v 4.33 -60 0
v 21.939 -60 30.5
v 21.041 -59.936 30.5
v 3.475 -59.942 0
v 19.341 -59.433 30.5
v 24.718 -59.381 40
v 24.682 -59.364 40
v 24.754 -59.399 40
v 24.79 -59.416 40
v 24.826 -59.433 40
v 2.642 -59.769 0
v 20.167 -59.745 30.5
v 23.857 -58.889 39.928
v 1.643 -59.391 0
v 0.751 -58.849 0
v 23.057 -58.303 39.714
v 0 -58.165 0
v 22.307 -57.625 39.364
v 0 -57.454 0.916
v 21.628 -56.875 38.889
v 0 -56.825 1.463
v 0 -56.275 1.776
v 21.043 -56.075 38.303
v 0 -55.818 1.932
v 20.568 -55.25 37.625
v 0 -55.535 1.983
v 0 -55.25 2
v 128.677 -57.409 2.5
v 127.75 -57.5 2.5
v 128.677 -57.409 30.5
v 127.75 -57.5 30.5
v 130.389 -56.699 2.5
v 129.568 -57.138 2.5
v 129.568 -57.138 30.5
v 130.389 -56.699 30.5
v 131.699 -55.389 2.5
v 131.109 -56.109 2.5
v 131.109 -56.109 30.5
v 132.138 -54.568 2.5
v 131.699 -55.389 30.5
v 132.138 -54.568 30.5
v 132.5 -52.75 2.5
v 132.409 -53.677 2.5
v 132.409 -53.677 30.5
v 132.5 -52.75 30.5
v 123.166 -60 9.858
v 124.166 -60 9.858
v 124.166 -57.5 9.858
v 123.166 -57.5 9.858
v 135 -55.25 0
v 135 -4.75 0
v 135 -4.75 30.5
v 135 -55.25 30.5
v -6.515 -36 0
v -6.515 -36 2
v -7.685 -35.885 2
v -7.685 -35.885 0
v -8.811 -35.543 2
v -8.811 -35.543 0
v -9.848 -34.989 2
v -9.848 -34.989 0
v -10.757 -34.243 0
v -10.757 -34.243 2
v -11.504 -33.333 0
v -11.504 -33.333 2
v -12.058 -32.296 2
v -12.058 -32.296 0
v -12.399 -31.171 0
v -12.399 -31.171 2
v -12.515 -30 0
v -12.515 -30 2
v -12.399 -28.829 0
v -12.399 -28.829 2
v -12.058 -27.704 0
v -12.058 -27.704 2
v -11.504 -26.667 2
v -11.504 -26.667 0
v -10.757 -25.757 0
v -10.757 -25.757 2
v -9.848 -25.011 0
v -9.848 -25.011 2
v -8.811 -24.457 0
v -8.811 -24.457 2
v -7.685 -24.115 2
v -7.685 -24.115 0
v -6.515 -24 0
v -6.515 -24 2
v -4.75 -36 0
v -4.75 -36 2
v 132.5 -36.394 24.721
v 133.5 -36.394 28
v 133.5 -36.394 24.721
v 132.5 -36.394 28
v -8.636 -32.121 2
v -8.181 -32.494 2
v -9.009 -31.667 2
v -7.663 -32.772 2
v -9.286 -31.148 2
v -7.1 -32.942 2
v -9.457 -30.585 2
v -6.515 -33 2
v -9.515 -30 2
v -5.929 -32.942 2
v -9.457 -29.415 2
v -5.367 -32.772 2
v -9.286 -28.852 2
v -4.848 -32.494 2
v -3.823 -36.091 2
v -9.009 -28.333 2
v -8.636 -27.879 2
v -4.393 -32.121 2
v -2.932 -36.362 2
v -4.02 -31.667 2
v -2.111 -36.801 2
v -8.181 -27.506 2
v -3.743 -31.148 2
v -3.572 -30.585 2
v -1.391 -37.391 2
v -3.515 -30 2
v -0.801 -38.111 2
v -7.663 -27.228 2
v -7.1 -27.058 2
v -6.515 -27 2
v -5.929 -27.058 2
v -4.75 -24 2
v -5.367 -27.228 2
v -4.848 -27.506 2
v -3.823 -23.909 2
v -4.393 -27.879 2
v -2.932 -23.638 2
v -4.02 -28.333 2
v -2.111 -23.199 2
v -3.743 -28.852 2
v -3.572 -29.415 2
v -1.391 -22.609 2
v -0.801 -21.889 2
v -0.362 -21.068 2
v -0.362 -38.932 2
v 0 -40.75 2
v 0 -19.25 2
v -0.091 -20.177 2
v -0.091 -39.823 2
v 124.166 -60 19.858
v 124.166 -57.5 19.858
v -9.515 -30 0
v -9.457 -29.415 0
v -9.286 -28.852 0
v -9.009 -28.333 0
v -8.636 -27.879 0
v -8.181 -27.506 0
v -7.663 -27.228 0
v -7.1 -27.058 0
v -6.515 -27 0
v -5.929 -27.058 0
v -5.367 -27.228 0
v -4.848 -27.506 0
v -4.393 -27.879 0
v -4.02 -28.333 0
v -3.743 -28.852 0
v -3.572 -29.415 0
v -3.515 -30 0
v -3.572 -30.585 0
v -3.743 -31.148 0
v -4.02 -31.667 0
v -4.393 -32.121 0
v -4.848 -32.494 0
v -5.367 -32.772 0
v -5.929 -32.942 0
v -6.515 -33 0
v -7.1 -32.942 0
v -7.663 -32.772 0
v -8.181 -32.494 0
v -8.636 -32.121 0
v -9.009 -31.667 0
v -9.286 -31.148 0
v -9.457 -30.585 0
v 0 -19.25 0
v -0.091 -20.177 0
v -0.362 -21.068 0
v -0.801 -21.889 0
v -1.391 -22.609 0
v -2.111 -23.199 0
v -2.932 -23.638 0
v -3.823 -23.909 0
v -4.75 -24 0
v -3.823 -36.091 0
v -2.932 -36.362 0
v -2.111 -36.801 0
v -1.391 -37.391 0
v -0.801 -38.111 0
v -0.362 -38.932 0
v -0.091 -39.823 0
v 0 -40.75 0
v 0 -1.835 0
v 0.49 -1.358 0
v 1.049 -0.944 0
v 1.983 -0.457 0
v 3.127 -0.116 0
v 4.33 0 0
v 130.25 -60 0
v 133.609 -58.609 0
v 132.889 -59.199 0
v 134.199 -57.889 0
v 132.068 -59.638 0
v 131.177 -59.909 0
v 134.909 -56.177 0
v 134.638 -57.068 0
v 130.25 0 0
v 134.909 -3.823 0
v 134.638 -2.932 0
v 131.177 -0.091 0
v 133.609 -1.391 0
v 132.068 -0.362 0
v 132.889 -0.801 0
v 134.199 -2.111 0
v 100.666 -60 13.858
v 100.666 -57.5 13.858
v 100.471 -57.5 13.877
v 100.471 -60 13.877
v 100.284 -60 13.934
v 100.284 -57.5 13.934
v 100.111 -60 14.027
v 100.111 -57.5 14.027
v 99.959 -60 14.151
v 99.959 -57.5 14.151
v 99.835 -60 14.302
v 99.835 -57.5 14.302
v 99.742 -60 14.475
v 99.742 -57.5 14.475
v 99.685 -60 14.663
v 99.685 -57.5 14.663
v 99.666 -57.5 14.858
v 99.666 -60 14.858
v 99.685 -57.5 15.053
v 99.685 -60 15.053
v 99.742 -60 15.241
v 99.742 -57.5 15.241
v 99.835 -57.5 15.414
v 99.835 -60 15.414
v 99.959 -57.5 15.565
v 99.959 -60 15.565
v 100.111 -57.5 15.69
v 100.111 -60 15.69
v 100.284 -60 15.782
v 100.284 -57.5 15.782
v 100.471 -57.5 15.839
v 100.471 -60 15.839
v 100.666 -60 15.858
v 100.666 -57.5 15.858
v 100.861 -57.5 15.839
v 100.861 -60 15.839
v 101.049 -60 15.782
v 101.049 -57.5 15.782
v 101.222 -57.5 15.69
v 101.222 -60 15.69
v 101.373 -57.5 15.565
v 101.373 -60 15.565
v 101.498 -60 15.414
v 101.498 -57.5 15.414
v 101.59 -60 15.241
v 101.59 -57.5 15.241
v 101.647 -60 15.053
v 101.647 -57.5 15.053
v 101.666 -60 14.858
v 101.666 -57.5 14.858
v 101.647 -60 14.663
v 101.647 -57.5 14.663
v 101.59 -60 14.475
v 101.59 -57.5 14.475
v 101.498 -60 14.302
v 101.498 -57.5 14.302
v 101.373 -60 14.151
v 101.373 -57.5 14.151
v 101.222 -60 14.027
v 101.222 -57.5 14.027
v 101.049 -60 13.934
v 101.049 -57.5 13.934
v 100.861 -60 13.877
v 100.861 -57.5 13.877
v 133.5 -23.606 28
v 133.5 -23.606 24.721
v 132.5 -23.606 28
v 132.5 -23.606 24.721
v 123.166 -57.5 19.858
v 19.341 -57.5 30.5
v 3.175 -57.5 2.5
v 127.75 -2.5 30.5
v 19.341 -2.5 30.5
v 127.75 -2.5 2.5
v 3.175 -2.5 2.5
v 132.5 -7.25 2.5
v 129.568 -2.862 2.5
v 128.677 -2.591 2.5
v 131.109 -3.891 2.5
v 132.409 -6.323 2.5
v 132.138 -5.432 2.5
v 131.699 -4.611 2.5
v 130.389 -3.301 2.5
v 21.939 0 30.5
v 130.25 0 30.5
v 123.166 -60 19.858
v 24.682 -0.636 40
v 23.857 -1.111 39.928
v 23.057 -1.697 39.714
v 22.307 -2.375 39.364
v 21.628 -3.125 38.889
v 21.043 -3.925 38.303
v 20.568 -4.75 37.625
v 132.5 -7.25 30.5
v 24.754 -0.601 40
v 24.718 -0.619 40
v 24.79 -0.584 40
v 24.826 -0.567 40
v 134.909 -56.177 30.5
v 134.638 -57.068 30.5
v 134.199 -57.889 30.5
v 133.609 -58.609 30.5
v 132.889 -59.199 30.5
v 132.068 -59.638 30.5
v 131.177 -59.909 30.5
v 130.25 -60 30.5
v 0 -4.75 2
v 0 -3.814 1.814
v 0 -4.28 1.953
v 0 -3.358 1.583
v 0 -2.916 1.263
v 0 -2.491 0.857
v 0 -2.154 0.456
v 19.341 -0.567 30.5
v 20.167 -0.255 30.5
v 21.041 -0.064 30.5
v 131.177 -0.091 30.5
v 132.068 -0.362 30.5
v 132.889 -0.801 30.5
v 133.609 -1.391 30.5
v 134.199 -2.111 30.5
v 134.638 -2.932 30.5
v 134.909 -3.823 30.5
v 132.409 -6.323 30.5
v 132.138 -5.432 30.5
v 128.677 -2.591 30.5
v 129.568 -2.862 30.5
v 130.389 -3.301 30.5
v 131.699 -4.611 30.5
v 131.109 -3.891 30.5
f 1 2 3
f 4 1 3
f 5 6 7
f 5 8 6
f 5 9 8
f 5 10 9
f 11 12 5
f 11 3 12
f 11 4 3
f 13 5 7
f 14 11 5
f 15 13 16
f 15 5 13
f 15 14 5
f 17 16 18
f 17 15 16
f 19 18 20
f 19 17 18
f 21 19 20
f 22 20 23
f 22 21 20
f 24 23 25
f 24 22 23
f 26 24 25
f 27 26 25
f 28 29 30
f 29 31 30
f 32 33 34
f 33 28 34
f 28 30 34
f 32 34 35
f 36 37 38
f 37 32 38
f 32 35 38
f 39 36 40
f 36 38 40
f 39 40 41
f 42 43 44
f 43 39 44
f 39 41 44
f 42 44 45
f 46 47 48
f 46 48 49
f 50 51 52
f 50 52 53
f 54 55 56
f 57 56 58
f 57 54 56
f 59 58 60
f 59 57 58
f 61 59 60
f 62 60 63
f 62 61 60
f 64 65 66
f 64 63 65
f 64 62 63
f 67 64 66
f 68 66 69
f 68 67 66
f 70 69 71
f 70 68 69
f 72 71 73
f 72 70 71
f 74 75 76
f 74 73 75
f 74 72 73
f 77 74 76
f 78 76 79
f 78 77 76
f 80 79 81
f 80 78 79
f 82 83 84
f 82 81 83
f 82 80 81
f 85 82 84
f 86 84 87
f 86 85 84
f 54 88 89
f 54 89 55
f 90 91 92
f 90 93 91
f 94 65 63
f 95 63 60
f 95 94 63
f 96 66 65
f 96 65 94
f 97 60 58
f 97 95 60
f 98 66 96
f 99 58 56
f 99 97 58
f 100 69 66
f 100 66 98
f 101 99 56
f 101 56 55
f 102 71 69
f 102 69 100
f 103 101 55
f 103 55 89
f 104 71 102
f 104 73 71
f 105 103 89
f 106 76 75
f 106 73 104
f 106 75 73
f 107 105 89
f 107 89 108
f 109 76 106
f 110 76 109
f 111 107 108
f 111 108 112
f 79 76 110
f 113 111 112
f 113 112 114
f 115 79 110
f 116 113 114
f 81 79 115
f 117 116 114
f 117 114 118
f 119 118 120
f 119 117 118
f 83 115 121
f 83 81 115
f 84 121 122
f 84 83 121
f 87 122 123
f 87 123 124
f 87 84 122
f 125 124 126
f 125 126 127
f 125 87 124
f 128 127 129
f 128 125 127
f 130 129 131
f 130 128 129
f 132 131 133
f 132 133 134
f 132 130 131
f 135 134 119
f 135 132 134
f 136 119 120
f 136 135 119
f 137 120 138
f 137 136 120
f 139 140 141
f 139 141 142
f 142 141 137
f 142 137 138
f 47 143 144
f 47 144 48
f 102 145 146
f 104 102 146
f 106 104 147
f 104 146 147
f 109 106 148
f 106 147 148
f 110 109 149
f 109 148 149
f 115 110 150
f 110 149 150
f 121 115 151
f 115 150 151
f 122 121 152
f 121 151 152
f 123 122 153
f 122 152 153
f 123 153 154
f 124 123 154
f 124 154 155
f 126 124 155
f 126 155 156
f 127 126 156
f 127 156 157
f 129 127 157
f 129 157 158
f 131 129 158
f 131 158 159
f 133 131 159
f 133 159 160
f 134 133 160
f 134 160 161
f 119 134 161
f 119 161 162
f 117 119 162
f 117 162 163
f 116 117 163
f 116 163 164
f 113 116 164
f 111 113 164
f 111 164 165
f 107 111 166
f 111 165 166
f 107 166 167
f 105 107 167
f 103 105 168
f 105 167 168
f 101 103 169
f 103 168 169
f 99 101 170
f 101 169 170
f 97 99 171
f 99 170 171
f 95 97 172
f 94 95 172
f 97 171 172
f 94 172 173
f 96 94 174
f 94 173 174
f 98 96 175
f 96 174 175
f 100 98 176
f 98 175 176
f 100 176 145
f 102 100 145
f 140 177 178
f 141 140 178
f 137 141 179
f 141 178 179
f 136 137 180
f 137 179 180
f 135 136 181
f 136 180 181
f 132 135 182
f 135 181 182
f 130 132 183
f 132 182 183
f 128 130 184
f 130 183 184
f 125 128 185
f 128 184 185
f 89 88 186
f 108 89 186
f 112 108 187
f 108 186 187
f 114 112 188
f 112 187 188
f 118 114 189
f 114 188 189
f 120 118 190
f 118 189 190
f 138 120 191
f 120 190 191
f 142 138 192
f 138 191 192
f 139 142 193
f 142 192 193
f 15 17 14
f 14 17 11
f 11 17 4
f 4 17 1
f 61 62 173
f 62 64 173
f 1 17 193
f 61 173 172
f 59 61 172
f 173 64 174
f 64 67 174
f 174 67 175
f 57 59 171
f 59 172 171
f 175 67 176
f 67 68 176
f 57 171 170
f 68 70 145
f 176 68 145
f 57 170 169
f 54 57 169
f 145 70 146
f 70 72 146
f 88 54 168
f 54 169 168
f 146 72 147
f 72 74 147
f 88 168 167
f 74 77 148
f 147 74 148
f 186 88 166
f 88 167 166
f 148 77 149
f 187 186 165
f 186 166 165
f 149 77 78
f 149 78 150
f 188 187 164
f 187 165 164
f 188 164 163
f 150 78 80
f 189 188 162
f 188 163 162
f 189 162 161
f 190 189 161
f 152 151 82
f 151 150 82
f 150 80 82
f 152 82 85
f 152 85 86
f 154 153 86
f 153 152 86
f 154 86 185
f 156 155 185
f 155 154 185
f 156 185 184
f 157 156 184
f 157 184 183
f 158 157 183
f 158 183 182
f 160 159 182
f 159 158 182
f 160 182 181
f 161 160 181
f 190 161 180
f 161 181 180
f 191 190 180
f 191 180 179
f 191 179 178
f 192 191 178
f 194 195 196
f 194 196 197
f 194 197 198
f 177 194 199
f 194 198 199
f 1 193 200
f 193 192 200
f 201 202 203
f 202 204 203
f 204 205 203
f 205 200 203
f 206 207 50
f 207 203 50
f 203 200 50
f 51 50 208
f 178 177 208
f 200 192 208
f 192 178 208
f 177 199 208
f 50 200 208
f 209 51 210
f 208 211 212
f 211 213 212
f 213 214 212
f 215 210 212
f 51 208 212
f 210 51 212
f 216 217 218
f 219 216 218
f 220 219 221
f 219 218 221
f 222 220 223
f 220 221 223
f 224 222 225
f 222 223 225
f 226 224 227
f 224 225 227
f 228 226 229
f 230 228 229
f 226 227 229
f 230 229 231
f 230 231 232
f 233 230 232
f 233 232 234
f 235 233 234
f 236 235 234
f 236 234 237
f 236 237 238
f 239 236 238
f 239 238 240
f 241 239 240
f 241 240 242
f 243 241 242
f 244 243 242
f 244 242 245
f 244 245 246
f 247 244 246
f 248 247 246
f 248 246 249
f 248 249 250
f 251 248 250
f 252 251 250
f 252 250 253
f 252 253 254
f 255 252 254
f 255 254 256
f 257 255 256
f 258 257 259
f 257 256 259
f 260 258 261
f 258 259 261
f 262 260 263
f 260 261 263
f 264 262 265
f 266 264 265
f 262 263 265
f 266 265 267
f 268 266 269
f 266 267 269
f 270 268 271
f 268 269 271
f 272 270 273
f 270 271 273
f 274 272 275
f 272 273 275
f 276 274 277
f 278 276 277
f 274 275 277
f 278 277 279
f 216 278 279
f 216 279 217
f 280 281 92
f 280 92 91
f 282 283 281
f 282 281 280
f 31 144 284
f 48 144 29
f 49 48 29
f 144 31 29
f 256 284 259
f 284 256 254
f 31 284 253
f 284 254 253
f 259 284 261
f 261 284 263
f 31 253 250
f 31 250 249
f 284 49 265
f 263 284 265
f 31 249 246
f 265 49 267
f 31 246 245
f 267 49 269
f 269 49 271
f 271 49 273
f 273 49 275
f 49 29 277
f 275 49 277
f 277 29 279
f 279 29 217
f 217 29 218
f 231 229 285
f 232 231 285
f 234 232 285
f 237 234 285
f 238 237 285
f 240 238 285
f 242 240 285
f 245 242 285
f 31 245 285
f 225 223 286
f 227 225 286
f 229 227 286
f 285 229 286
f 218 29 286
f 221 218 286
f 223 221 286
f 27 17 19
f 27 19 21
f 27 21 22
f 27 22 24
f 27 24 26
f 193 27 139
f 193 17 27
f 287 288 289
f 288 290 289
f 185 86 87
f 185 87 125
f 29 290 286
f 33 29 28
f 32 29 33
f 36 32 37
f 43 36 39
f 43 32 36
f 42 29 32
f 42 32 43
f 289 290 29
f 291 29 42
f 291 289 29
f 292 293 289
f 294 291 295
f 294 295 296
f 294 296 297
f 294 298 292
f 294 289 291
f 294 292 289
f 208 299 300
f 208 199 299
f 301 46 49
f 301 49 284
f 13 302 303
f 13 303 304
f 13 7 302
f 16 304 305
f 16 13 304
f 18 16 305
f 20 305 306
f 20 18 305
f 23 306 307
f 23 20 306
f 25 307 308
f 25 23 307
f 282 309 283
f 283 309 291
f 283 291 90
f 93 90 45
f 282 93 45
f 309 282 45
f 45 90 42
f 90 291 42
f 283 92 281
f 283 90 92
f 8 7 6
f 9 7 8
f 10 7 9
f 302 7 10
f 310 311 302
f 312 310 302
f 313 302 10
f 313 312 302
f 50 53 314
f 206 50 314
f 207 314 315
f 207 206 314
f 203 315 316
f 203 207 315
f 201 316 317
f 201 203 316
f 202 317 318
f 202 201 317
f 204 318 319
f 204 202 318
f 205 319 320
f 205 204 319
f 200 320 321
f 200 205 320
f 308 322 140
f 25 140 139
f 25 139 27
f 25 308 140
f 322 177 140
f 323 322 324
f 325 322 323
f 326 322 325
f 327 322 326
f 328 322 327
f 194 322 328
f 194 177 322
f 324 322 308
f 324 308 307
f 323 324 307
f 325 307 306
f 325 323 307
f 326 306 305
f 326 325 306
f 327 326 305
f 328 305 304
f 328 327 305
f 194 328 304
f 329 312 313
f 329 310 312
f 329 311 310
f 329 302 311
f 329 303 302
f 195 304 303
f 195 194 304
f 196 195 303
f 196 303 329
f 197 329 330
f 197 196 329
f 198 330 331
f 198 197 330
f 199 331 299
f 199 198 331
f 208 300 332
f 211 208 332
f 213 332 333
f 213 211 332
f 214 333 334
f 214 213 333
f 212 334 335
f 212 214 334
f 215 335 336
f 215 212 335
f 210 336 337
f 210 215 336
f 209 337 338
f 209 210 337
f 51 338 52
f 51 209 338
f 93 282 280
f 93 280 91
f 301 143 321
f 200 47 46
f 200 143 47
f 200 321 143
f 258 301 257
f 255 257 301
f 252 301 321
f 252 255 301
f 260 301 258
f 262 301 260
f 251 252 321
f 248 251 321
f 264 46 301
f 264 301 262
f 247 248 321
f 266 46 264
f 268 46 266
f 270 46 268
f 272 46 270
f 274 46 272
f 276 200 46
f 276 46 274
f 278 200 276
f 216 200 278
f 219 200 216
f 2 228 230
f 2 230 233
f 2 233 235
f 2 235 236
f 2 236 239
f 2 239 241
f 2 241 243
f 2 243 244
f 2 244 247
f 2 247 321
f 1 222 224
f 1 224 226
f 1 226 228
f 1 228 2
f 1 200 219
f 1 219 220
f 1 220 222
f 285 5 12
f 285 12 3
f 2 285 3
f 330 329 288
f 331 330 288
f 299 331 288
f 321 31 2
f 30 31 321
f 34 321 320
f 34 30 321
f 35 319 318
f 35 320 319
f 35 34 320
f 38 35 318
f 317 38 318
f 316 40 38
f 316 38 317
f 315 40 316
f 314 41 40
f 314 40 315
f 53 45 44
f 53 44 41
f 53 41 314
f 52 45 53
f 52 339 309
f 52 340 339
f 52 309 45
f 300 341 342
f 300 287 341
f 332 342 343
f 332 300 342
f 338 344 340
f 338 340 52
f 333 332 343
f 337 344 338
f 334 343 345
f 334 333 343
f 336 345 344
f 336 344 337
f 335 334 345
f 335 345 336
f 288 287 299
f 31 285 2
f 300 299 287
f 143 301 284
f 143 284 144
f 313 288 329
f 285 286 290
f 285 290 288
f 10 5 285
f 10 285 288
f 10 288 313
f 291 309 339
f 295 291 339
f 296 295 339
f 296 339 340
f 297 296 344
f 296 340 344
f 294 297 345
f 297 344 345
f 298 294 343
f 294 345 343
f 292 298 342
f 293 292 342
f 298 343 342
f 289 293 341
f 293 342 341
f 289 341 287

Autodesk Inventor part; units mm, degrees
ref_plane "YZ Plane" through (0, 0, 0) normal (1, 0, 0) x (0, 1, 0)
ref_plane "XZ Plane" through (0, 0, 0) normal (0, 1, 0) x (-1, 0, 0)
ref_plane "XY Plane" through (0, 0, 0) normal (0, 0, 1) x (1, 0, 0)
sketch "Skizze1" plane through (0, 0, 0) normal (0, 0, 1) x (1, 0, 0)
  line L0 (0, 0) -> (135, 0)
  line L1 (135, 0) -> (135, -60)
  line L2 (135, -60) -> (0, -60)
  line L3 (0, -60) -> (0, 0)
  dimension "d0" = 135
  dimension "d1" = 60
extrude "Extrusion1" add sketch "Skizze1" along normal blind 40
chamfer "Fase1" distance 38 angle 30 1 edges at (0, -30, 40) measured on face at (0, -20, 13.3333)
shell "Wandung1" thickness 2.5 removed faces 1 at (59.626207, -20, 40)
sketch "Skizze2" plane through (0, 0, 40) normal (0, 0, 1) x (1, 0, 0)
  line L0 (24.826062, -57.5) -> (24.826062, -2.5)
  line L1 (24.826062, -2.5) -> (24.826062, 0)
  line L2 (24.826062, 0) -> (24.826062, -57.5)
  line L3 (24.826062, -57.5) -> (24.826062, -60)
  line L4 (32.285534, -57.5) -> (32.285534, -2.5)
  line L5 (32.285534, -2.5) -> (132.5, -2.5)
  line L6 (132.5, -2.5) -> (132.5, -57.5)
  line L7 (132.5, -57.5) -> (32.285534, -57.5)
  line L8 (21.290528, -60) -> (21.290528, 0)
  line L9 (21.290528, -60) -> (24.826062, -60)
  line L10 (135.042932, -60) -> (135.042932, 0)
  line L11 (135.042932, 0) -> (24.826062, 0)
  line L12 (24.826062, -60) -> (135.042932, -60)
  line L13 (24.826062, 0) -> (21.290528, 0)
  point P0 (0, 0)
  point P1 (32.285534, -2.5)
extrude "Extrusion2" cut sketch "Skizze2" against normal blind 9.5 contours L0 L1 L11 L10 L12 L3
sketch "Skizze3" plane through (0, -60, 0) normal (0, -1, 0) x (1, 0, 0)
  point P0 (0, 0)
  point P1 (100.666226, 14.858037)
hole "Bohrung1" at (100.666226, -60, 14.858037) direction (0, 1, 0) diameter 2 depth 8 tip angle 118
sketch "Skizze4" plane through (132.5, -57.5, 2.5) normal (-1, 0, 0) x (0, 0, 1)
  line L0 (22.221117, 33.89428) -> (25.5, 33.89428)
  line L1 (25.5, 33.89428) -> (25.5, 21.10572)
  line L2 (25.5, 21.10572) -> (22.221117, 21.10572)
  line L3 (22.221117, 21.10572) -> (22.221117, 33.89428)
  line L4 (0, 0) -> (0, 55)
  line L5 (0, 27.5) -> (28, 27.5)
  line L6 (28, 0) -> (28, 55)
  line L7 (28, 57.5) -> (28, -2.5)
  point P0 (-2.5, 57.5)
  dimension "d22" = 2.5
extrude "Extrusion3" cut sketch "Skizze4" against normal blind 1
sketch "Skizze5" plane through (0, -60, 0) normal (0, -1, 0) x (1, 0, 0)
  line L0 (132.5, 30.5) -> (24.826062, 30.5)
  line L1 (32.285534, 30.5) -> (19.341234, 30.5)
  line L2 (19.341234, 30.5) -> (24.826062, 40)
  line L3 (3.175426, 2.5) -> (24.826062, 40)
  line L4 (24.826062, 40) -> (32.013518, 40)
  line L5 (32.013518, 40) -> (32.013518, 30.5)
  point P0 (0, 0)
  point P1 (2.5, 4.827159)
  point P2 (23.251035, 30.965501)
  point P3 (127.540528, 30.5)
  point P4 (24.826062, 40)
extrude "Extrusion4" cut sketch "Skizze5" against normal through all
sketch "Skizze6" plane through (0, -60, 0) normal (0, -1, 0) x (1, 0, 0)
  circle A0 centre (100.666226, 14.858037) radius 1
  line L0 (124.166226, 9.858037) -> (123.166226, 9.858037)
  line L1 (123.166226, 9.858037) -> (123.166226, 19.858037)
  line L2 (123.166226, 19.858037) -> (124.166226, 19.858037)
  line L3 (124.166226, 19.858037) -> (124.166226, 9.858037)
  line L4 (100.666226, 14.858037) -> (116.026843, 14.858037)
  point P0 (0, 0)
  dimension "d23" = 1
  dimension "d24" = 10
  dimension "d25" = 22.5
extrude "Extrusion5" cut sketch "Skizze6" against normal up to surface (2.5 mm away) contours L0 L1 L2 L3
sketch "Skizze7" plane through (0, 0, 0) normal (0, 0, -1) x (-1, 0, 0)
  line L0 (0, -36) -> (6.514704, -36)
  line L1 (12.514704, -30) -> (12.514704, -30)
  line L2 (6.514704, -24) -> (0, -24)
  line L3 (0, -24) -> (0, -36)
  line L4 (-21.93931, -60) -> (-21.93931, 0)
  line L5 (-21.93931, -30) -> (18.562445, -30)
  circle A0 centre (6.514704, -30) radius 3
  arc A1 (6.514704, -36) -> (12.514704, -30) centre (6.514704, -30) ccw
  arc A2 (12.514704, -30) -> (6.514704, -24) centre (6.514704, -30) ccw
  point P0 (0, 0)
  point P1 (12.514704, -30)
  dimension "d28" = 6
  dimension "d29" = 6
  dimension "d30" = 6
  dimension "d31" = 6
extrude "Extrusion6" add sketch "Skizze7" against normal blind 2 contours L3 L5 A0 A1 L0 | L3 L2 A2 L5 A0
fillet "Rundung1" radius 4.75 2 edges at (0, -24, 1) (0, -36, 1)
fillet "Rundung2" radius 4.75 7 edges at (21.9393, -30, 40) (10.9697, -60, 21) (10.9697, 0, 21) (135, 0, 15.25) (135, -60, 15.25) (132.5, -57.5, 16.5) (132.5, -2.5, 16.5)
properties part number "Case"
